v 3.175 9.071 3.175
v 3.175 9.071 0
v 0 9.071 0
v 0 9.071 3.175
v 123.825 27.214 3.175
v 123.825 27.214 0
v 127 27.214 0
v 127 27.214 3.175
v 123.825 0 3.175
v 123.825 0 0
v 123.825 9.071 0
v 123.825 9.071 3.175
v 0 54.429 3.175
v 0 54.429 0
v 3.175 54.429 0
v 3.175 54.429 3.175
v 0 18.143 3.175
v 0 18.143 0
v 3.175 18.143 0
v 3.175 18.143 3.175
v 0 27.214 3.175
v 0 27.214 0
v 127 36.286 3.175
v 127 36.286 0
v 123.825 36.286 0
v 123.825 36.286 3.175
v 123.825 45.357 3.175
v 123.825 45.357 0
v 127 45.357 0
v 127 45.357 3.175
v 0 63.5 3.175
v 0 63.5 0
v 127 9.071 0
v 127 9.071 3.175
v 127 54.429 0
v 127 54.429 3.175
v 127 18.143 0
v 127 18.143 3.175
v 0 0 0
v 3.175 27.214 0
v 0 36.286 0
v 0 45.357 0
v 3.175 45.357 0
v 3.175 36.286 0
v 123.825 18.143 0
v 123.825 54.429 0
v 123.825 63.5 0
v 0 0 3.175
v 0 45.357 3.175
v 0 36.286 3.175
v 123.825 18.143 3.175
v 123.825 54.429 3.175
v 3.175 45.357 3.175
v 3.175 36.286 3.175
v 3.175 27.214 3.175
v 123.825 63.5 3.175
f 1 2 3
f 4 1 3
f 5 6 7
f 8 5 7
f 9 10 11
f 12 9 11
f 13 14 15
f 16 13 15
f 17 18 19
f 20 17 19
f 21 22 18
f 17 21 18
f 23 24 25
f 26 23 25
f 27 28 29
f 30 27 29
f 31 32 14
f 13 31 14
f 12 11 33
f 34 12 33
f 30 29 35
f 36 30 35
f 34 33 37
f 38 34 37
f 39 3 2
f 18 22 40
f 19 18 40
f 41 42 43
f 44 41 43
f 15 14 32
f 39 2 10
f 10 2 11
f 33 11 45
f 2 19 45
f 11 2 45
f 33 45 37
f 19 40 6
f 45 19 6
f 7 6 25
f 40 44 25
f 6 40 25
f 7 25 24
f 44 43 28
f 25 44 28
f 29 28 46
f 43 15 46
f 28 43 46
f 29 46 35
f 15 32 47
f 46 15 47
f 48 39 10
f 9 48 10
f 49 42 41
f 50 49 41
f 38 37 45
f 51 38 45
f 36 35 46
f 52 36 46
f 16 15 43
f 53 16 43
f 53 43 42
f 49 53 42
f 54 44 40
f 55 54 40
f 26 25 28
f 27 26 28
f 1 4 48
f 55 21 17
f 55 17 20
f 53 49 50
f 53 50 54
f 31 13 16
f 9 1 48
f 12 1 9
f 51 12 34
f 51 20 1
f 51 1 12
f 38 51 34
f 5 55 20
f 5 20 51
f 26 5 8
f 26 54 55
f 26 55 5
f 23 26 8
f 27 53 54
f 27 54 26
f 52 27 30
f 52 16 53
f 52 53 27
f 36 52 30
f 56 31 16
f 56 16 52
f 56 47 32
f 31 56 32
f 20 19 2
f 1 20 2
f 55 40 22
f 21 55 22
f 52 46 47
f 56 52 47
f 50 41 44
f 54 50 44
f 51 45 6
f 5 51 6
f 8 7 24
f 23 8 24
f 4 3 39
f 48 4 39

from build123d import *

# Parameters (mm, degrees)
F1_DEPTH = 3.175


with BuildPart() as f1:
    # F0 (on Top) → F1 (new body)
    with BuildSketch(Plane.XY):
        Polygon((0, 9.071429), (0, 0), (123.825, 0), (123.825, 9.071429), (127, 9.071429), (127, 18.142857), (123.825, 18.142857), (123.825, 27.214286), (127, 27.214286), (127, 36.285714), (123.825, 36.285714), (123.825, 45.357143), (127, 45.357143), (127, 54.428571), (123.825, 54.428571), (123.825, 63.5), (0, 63.5), (0, 54.428571), (3.175, 54.428571), (3.175, 45.357143), (0, 45.357143), (0, 36.285714), (3.175, 36.285714), (3.175, 27.214286), (0, 27.214286), (0, 18.142857), (3.175, 18.142857), (3.175, 9.071429), align=None)
    extrude(amount=F1_DEPTH)


solid = f1.part
